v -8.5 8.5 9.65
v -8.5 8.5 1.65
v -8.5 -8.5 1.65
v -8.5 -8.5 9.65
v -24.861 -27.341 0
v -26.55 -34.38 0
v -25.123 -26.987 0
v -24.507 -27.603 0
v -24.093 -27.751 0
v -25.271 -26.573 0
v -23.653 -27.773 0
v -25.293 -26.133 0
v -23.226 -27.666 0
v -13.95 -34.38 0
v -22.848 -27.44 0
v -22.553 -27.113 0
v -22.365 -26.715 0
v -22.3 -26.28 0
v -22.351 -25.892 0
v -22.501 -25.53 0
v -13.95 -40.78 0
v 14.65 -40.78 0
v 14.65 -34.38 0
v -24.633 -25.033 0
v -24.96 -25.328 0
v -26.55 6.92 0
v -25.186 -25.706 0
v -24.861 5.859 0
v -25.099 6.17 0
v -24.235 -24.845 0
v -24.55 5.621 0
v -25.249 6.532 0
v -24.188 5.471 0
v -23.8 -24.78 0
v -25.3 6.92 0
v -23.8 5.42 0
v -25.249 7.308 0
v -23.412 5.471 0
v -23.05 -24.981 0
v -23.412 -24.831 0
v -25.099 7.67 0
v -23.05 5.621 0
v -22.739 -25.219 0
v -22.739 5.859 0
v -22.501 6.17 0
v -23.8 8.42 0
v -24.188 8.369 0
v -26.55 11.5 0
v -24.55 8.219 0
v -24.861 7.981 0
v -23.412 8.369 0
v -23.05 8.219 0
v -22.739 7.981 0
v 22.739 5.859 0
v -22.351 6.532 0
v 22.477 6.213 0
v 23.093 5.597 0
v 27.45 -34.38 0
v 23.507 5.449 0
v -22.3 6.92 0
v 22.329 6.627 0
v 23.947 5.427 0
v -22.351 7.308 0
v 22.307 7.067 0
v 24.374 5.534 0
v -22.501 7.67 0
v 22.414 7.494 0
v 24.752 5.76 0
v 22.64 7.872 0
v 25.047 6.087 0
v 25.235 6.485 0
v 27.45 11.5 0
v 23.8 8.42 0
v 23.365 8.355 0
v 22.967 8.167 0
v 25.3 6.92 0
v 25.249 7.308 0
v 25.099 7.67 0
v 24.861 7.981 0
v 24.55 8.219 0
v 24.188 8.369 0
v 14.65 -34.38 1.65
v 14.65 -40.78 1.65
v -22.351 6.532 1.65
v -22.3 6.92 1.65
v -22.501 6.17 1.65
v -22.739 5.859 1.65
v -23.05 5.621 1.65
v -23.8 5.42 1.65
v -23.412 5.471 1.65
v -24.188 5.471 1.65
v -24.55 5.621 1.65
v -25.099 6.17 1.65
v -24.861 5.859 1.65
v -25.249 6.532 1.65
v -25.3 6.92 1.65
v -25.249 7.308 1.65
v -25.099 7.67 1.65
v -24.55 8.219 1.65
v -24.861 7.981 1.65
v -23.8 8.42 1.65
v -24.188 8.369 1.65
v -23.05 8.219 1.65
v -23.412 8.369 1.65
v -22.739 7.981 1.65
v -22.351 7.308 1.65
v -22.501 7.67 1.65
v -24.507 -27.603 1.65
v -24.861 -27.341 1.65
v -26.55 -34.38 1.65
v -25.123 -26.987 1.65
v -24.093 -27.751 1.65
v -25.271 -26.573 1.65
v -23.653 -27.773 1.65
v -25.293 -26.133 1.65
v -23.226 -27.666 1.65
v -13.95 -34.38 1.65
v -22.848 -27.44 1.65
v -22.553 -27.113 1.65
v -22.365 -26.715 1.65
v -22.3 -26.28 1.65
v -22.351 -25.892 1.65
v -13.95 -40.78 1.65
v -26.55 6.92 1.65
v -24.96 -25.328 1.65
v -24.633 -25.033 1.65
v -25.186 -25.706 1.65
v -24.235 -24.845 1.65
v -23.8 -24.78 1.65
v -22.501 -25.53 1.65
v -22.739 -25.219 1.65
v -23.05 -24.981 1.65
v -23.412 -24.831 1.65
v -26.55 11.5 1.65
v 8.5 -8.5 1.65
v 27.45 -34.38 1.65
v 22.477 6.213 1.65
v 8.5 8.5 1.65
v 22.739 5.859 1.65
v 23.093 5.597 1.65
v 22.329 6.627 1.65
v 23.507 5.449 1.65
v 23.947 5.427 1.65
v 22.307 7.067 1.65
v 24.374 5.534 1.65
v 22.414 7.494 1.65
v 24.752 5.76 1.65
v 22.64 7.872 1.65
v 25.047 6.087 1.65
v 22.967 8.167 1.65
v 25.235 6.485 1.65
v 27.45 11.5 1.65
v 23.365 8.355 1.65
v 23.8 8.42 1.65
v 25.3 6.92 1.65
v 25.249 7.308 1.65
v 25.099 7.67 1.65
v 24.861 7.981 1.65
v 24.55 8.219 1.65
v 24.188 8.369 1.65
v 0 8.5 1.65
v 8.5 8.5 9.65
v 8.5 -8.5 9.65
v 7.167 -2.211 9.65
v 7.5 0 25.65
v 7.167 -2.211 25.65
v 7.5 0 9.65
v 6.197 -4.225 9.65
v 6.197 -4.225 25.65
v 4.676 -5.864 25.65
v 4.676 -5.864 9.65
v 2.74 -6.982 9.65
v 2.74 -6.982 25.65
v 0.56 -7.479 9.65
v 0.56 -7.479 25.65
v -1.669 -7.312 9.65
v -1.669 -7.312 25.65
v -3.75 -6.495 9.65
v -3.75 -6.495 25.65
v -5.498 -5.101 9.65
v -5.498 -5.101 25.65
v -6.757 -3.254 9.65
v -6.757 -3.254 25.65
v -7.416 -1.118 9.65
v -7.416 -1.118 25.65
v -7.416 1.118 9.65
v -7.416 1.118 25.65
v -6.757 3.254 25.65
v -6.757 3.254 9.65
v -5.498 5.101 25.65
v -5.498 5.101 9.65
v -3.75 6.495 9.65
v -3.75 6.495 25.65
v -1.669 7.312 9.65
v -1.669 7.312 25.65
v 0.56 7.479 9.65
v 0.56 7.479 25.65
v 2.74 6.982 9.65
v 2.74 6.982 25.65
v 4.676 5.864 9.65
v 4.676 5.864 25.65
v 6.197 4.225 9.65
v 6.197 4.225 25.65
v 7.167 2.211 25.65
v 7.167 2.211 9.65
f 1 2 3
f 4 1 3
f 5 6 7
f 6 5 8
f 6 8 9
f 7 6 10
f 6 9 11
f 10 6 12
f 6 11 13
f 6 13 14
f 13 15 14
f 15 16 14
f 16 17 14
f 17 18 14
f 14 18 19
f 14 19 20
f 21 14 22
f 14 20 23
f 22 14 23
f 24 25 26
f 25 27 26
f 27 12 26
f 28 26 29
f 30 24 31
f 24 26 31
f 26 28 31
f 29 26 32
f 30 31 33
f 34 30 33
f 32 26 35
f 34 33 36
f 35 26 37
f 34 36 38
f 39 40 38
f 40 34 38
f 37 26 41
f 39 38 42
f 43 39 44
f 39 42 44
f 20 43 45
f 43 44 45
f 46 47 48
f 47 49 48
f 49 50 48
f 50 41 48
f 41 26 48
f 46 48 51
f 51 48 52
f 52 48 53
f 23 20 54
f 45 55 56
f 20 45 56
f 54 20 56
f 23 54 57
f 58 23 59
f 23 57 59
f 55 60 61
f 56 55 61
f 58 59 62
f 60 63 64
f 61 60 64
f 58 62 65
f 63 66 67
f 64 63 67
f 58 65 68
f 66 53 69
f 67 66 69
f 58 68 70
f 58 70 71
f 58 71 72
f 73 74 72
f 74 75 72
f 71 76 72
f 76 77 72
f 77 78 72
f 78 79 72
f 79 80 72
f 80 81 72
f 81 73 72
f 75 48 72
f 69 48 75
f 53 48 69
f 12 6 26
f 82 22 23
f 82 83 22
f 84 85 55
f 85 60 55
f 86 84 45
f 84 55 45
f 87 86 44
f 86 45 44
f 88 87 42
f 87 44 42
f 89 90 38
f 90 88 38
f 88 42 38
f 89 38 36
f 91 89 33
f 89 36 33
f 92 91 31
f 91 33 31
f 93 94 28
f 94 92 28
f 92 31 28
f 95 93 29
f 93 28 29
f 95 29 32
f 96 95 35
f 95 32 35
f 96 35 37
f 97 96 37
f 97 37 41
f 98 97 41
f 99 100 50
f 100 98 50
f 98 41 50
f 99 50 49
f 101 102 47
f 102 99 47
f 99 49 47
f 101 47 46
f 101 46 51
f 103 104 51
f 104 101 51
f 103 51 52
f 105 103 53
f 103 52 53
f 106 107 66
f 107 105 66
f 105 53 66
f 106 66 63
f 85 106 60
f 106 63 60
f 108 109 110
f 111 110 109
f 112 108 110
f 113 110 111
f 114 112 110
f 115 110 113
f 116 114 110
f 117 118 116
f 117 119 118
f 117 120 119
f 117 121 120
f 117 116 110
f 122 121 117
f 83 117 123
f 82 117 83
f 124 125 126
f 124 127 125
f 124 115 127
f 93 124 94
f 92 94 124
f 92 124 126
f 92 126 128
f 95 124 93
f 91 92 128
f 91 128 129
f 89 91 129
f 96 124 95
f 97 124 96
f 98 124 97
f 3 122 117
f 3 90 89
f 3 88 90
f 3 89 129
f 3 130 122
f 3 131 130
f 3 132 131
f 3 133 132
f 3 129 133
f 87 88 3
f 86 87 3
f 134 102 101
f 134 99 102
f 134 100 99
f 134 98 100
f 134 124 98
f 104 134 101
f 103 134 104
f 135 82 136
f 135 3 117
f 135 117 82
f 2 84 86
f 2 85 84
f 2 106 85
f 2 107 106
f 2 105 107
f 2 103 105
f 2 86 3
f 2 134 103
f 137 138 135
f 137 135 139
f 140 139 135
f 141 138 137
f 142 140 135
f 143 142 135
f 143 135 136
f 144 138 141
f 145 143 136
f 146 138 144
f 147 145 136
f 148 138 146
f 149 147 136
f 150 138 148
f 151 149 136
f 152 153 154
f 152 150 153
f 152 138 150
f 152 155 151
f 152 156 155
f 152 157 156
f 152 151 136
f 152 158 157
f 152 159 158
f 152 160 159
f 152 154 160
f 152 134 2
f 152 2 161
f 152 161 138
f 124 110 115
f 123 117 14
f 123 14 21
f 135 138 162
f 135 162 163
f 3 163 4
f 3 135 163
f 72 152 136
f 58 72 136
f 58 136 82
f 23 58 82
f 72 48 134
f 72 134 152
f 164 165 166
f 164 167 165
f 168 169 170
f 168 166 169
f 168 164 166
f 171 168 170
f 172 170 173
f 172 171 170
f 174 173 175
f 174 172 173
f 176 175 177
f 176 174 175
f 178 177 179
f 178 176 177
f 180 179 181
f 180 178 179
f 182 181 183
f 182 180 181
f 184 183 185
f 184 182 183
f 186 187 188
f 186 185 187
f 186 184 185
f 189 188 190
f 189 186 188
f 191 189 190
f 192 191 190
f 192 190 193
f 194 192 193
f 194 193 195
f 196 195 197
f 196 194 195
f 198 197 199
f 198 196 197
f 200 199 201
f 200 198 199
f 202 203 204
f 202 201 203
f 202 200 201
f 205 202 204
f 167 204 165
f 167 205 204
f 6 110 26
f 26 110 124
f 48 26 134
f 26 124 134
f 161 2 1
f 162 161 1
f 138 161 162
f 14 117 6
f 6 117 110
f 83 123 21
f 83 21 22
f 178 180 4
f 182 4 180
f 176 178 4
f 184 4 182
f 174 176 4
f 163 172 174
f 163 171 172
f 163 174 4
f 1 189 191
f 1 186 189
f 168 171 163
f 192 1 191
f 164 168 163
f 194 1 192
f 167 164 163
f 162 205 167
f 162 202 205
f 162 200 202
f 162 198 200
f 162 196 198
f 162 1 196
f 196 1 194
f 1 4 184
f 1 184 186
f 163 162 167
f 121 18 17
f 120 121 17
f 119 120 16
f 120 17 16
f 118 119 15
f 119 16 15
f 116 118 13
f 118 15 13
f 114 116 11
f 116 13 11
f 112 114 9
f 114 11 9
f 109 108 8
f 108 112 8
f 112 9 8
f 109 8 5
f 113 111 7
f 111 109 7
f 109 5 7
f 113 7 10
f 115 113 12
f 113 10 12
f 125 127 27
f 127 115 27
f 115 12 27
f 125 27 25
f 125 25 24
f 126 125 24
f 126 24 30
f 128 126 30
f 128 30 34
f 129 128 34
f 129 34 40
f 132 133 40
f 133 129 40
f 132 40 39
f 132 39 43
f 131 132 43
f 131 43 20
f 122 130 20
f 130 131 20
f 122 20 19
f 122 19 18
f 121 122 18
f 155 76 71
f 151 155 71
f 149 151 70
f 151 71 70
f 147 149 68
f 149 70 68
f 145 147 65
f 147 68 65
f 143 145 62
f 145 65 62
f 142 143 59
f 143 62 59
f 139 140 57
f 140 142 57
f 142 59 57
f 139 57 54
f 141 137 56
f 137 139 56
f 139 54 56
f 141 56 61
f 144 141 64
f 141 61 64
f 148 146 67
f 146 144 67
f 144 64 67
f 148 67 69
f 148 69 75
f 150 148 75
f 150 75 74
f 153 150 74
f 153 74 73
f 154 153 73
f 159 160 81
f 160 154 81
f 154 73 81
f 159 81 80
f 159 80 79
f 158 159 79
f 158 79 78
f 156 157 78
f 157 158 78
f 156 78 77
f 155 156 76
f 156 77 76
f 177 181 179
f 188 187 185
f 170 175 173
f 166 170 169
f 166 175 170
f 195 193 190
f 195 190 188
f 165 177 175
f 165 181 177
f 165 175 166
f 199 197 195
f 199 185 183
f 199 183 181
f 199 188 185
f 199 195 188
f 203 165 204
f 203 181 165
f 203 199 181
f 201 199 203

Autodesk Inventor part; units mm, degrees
ref_plane "YZ Plane" through (0, 0, 0) normal (1, 0, 0) x (0, 1, 0)
ref_plane "XZ Plane" through (0, 0, 0) normal (0, 1, 0) x (-1, 0, 0)
ref_plane "XY Plane" through (0, 0, 0) normal (0, 0, 1) x (1, 0, 0)
sketch "Sketch1" plane through (0, 0, 0) normal (0, 0, 1) x (1, 0, 0)
  line L0 (0, 0) -> (0, 8.5)
  line L1 (0, 8.5) -> (8.5, 8.5)
  line L2 (8.5, 8.5) -> (8.5, -8.5)
  line L3 (8.5, -8.5) -> (-8.5, -8.5)
  line L4 (-8.5, -8.5) -> (-8.5, 8.5)
  line L5 (-8.5, 8.5) -> (0, 8.5)
  line L6 (0, 8.5) -> (0, 10.25)
  line L7 (0, 10.25) -> (-23.8, 10.25)
  line L8 (-23.8, 10.25) -> (-23.8, 6.92)
  circle A0 centre (-23.8, 6.92) radius 1.5
  line L9 (0, 10.25) -> (23.8, 10.25)
  line L10 (23.8, 10.25) -> (23.8, 6.92)
  circle A1 centre (23.8, 6.92) radius 1.5
  line L11 (-23.8, 6.92) -> (-23.8, -26.28)
  circle A2 centre (-23.8, -26.28) radius 1.5
  line L12 (0, 0) -> (0, 6.92)
  line L13 (-25.3, 6.92) -> (-26.55, 6.92)
  line L14 (-26.55, 6.92) -> (-26.55, -28.83)
  line L15 (-26.55, 6.92) -> (-26.55, 11.5)
  line L16 (-26.55, 11.5) -> (27.45, 11.5)
  line L17 (27.45, 11.5) -> (27.45, 11.5)
  line L18 (27.45, 11.5) -> (27.45, -28.83)
  line L19 (27.45, -28.83) -> (-26.55, -28.83)
  dimension "d8" = 3
  dimension "d0" = 8.5
  dimension "d1" = 8.5
  dimension "d2" = 17
  dimension "d3" = 17
  dimension "d4" = 17
  dimension "d5" = 1.75
  dimension "d6" = 23.8
  dimension "d7" = 3.33
  dimension "d9" = 23.8
  dimension "d10" = 3.33
  dimension "d11" = 3
  dimension "d12" = 33.2
  dimension "d13" = 3
  dimension "d14" = 1.25
  dimension "d15" = 35.75
  dimension "d16" = 4.58
  dimension "d17" = 0
  dimension "d33" = 54
extrude "Extrusion1" add sketch "Sketch1" along normal blind 1.65
sketch "Sketch2" plane through (0, 0, 1.65) normal (0, 0, 1) x (1, 0, 0)
  line L0 (-8.5, 8.5) -> (-8.5, -8.5) projected
  line L1 (8.5, 8.5) -> (8.5, -8.5) projected
  line L2 (-8.5, 8.5) -> (8.5, 8.5)
  line L3 (8.5, 8.5) -> (8.5, -8.5)
  line L4 (8.5, -8.5) -> (-8.5, -8.5)
  line L5 (-8.5, -8.5) -> (-8.5, 8.5)
  point P0 (0, 0)
extrude "Extrusion2" add sketch "Sketch2" along normal blind 8 and the other way blind 1.65
sketch "Sketch3" plane through (0, 0, 9.65) normal (0, 0, 1) x (1, 0, 0)
  circle A0 centre (0, 0) radius 7.5
  dimension "d24" = 15
extrude "Extrusion3" add sketch "Sketch3" along normal blind 16
sketch "Sketch4" plane through (0, 0, 1.65) normal (0, 0, 1) x (1, 0, 0)
  line L0 (-26.55, -28.83) -> (27.45, -28.83) projected
  line L1 (-26.55, -28.83) -> (27.45, -28.83)
  line L2 (27.45, -28.83) -> (27.45, -34.38)
  line L3 (27.45, -34.38) -> (-26.55, -34.38)
  line L4 (-26.55, -34.38) -> (-26.55, -28.83)
  point P0 (0, 0)
  dimension "d27" = 5.55
  dimension "d34" = 54
extrude "Extrusion4" add sketch "Sketch4" against normal blind 1.65
sketch "Sketch5" plane through (0, 0, 1.65) normal (0, 0, 1) x (1, 0, 0)
  line L0 (27.45, -34.38) -> (-26.55, -34.38) projected
  line L1 (-26.55, -34.38) -> (-13.95, -34.38)
  line L2 (-13.95, -34.38) -> (-13.95, -40.78)
  line L3 (-13.95, -40.78) -> (14.65, -40.78)
  line L4 (14.65, -40.78) -> (14.65, -34.38)
  line L5 (14.65, -34.38) -> (-13.95, -34.38)
  point P0 (0, 0)
  dimension "d30" = 12.6
  dimension "d31" = 6.4
  dimension "d32" = 28.6
extrude "Extrusion5" add sketch "Sketch5" against normal blind 1.65
equation "\"d9\" = d6"
properties part number "Pixy Sketch"
